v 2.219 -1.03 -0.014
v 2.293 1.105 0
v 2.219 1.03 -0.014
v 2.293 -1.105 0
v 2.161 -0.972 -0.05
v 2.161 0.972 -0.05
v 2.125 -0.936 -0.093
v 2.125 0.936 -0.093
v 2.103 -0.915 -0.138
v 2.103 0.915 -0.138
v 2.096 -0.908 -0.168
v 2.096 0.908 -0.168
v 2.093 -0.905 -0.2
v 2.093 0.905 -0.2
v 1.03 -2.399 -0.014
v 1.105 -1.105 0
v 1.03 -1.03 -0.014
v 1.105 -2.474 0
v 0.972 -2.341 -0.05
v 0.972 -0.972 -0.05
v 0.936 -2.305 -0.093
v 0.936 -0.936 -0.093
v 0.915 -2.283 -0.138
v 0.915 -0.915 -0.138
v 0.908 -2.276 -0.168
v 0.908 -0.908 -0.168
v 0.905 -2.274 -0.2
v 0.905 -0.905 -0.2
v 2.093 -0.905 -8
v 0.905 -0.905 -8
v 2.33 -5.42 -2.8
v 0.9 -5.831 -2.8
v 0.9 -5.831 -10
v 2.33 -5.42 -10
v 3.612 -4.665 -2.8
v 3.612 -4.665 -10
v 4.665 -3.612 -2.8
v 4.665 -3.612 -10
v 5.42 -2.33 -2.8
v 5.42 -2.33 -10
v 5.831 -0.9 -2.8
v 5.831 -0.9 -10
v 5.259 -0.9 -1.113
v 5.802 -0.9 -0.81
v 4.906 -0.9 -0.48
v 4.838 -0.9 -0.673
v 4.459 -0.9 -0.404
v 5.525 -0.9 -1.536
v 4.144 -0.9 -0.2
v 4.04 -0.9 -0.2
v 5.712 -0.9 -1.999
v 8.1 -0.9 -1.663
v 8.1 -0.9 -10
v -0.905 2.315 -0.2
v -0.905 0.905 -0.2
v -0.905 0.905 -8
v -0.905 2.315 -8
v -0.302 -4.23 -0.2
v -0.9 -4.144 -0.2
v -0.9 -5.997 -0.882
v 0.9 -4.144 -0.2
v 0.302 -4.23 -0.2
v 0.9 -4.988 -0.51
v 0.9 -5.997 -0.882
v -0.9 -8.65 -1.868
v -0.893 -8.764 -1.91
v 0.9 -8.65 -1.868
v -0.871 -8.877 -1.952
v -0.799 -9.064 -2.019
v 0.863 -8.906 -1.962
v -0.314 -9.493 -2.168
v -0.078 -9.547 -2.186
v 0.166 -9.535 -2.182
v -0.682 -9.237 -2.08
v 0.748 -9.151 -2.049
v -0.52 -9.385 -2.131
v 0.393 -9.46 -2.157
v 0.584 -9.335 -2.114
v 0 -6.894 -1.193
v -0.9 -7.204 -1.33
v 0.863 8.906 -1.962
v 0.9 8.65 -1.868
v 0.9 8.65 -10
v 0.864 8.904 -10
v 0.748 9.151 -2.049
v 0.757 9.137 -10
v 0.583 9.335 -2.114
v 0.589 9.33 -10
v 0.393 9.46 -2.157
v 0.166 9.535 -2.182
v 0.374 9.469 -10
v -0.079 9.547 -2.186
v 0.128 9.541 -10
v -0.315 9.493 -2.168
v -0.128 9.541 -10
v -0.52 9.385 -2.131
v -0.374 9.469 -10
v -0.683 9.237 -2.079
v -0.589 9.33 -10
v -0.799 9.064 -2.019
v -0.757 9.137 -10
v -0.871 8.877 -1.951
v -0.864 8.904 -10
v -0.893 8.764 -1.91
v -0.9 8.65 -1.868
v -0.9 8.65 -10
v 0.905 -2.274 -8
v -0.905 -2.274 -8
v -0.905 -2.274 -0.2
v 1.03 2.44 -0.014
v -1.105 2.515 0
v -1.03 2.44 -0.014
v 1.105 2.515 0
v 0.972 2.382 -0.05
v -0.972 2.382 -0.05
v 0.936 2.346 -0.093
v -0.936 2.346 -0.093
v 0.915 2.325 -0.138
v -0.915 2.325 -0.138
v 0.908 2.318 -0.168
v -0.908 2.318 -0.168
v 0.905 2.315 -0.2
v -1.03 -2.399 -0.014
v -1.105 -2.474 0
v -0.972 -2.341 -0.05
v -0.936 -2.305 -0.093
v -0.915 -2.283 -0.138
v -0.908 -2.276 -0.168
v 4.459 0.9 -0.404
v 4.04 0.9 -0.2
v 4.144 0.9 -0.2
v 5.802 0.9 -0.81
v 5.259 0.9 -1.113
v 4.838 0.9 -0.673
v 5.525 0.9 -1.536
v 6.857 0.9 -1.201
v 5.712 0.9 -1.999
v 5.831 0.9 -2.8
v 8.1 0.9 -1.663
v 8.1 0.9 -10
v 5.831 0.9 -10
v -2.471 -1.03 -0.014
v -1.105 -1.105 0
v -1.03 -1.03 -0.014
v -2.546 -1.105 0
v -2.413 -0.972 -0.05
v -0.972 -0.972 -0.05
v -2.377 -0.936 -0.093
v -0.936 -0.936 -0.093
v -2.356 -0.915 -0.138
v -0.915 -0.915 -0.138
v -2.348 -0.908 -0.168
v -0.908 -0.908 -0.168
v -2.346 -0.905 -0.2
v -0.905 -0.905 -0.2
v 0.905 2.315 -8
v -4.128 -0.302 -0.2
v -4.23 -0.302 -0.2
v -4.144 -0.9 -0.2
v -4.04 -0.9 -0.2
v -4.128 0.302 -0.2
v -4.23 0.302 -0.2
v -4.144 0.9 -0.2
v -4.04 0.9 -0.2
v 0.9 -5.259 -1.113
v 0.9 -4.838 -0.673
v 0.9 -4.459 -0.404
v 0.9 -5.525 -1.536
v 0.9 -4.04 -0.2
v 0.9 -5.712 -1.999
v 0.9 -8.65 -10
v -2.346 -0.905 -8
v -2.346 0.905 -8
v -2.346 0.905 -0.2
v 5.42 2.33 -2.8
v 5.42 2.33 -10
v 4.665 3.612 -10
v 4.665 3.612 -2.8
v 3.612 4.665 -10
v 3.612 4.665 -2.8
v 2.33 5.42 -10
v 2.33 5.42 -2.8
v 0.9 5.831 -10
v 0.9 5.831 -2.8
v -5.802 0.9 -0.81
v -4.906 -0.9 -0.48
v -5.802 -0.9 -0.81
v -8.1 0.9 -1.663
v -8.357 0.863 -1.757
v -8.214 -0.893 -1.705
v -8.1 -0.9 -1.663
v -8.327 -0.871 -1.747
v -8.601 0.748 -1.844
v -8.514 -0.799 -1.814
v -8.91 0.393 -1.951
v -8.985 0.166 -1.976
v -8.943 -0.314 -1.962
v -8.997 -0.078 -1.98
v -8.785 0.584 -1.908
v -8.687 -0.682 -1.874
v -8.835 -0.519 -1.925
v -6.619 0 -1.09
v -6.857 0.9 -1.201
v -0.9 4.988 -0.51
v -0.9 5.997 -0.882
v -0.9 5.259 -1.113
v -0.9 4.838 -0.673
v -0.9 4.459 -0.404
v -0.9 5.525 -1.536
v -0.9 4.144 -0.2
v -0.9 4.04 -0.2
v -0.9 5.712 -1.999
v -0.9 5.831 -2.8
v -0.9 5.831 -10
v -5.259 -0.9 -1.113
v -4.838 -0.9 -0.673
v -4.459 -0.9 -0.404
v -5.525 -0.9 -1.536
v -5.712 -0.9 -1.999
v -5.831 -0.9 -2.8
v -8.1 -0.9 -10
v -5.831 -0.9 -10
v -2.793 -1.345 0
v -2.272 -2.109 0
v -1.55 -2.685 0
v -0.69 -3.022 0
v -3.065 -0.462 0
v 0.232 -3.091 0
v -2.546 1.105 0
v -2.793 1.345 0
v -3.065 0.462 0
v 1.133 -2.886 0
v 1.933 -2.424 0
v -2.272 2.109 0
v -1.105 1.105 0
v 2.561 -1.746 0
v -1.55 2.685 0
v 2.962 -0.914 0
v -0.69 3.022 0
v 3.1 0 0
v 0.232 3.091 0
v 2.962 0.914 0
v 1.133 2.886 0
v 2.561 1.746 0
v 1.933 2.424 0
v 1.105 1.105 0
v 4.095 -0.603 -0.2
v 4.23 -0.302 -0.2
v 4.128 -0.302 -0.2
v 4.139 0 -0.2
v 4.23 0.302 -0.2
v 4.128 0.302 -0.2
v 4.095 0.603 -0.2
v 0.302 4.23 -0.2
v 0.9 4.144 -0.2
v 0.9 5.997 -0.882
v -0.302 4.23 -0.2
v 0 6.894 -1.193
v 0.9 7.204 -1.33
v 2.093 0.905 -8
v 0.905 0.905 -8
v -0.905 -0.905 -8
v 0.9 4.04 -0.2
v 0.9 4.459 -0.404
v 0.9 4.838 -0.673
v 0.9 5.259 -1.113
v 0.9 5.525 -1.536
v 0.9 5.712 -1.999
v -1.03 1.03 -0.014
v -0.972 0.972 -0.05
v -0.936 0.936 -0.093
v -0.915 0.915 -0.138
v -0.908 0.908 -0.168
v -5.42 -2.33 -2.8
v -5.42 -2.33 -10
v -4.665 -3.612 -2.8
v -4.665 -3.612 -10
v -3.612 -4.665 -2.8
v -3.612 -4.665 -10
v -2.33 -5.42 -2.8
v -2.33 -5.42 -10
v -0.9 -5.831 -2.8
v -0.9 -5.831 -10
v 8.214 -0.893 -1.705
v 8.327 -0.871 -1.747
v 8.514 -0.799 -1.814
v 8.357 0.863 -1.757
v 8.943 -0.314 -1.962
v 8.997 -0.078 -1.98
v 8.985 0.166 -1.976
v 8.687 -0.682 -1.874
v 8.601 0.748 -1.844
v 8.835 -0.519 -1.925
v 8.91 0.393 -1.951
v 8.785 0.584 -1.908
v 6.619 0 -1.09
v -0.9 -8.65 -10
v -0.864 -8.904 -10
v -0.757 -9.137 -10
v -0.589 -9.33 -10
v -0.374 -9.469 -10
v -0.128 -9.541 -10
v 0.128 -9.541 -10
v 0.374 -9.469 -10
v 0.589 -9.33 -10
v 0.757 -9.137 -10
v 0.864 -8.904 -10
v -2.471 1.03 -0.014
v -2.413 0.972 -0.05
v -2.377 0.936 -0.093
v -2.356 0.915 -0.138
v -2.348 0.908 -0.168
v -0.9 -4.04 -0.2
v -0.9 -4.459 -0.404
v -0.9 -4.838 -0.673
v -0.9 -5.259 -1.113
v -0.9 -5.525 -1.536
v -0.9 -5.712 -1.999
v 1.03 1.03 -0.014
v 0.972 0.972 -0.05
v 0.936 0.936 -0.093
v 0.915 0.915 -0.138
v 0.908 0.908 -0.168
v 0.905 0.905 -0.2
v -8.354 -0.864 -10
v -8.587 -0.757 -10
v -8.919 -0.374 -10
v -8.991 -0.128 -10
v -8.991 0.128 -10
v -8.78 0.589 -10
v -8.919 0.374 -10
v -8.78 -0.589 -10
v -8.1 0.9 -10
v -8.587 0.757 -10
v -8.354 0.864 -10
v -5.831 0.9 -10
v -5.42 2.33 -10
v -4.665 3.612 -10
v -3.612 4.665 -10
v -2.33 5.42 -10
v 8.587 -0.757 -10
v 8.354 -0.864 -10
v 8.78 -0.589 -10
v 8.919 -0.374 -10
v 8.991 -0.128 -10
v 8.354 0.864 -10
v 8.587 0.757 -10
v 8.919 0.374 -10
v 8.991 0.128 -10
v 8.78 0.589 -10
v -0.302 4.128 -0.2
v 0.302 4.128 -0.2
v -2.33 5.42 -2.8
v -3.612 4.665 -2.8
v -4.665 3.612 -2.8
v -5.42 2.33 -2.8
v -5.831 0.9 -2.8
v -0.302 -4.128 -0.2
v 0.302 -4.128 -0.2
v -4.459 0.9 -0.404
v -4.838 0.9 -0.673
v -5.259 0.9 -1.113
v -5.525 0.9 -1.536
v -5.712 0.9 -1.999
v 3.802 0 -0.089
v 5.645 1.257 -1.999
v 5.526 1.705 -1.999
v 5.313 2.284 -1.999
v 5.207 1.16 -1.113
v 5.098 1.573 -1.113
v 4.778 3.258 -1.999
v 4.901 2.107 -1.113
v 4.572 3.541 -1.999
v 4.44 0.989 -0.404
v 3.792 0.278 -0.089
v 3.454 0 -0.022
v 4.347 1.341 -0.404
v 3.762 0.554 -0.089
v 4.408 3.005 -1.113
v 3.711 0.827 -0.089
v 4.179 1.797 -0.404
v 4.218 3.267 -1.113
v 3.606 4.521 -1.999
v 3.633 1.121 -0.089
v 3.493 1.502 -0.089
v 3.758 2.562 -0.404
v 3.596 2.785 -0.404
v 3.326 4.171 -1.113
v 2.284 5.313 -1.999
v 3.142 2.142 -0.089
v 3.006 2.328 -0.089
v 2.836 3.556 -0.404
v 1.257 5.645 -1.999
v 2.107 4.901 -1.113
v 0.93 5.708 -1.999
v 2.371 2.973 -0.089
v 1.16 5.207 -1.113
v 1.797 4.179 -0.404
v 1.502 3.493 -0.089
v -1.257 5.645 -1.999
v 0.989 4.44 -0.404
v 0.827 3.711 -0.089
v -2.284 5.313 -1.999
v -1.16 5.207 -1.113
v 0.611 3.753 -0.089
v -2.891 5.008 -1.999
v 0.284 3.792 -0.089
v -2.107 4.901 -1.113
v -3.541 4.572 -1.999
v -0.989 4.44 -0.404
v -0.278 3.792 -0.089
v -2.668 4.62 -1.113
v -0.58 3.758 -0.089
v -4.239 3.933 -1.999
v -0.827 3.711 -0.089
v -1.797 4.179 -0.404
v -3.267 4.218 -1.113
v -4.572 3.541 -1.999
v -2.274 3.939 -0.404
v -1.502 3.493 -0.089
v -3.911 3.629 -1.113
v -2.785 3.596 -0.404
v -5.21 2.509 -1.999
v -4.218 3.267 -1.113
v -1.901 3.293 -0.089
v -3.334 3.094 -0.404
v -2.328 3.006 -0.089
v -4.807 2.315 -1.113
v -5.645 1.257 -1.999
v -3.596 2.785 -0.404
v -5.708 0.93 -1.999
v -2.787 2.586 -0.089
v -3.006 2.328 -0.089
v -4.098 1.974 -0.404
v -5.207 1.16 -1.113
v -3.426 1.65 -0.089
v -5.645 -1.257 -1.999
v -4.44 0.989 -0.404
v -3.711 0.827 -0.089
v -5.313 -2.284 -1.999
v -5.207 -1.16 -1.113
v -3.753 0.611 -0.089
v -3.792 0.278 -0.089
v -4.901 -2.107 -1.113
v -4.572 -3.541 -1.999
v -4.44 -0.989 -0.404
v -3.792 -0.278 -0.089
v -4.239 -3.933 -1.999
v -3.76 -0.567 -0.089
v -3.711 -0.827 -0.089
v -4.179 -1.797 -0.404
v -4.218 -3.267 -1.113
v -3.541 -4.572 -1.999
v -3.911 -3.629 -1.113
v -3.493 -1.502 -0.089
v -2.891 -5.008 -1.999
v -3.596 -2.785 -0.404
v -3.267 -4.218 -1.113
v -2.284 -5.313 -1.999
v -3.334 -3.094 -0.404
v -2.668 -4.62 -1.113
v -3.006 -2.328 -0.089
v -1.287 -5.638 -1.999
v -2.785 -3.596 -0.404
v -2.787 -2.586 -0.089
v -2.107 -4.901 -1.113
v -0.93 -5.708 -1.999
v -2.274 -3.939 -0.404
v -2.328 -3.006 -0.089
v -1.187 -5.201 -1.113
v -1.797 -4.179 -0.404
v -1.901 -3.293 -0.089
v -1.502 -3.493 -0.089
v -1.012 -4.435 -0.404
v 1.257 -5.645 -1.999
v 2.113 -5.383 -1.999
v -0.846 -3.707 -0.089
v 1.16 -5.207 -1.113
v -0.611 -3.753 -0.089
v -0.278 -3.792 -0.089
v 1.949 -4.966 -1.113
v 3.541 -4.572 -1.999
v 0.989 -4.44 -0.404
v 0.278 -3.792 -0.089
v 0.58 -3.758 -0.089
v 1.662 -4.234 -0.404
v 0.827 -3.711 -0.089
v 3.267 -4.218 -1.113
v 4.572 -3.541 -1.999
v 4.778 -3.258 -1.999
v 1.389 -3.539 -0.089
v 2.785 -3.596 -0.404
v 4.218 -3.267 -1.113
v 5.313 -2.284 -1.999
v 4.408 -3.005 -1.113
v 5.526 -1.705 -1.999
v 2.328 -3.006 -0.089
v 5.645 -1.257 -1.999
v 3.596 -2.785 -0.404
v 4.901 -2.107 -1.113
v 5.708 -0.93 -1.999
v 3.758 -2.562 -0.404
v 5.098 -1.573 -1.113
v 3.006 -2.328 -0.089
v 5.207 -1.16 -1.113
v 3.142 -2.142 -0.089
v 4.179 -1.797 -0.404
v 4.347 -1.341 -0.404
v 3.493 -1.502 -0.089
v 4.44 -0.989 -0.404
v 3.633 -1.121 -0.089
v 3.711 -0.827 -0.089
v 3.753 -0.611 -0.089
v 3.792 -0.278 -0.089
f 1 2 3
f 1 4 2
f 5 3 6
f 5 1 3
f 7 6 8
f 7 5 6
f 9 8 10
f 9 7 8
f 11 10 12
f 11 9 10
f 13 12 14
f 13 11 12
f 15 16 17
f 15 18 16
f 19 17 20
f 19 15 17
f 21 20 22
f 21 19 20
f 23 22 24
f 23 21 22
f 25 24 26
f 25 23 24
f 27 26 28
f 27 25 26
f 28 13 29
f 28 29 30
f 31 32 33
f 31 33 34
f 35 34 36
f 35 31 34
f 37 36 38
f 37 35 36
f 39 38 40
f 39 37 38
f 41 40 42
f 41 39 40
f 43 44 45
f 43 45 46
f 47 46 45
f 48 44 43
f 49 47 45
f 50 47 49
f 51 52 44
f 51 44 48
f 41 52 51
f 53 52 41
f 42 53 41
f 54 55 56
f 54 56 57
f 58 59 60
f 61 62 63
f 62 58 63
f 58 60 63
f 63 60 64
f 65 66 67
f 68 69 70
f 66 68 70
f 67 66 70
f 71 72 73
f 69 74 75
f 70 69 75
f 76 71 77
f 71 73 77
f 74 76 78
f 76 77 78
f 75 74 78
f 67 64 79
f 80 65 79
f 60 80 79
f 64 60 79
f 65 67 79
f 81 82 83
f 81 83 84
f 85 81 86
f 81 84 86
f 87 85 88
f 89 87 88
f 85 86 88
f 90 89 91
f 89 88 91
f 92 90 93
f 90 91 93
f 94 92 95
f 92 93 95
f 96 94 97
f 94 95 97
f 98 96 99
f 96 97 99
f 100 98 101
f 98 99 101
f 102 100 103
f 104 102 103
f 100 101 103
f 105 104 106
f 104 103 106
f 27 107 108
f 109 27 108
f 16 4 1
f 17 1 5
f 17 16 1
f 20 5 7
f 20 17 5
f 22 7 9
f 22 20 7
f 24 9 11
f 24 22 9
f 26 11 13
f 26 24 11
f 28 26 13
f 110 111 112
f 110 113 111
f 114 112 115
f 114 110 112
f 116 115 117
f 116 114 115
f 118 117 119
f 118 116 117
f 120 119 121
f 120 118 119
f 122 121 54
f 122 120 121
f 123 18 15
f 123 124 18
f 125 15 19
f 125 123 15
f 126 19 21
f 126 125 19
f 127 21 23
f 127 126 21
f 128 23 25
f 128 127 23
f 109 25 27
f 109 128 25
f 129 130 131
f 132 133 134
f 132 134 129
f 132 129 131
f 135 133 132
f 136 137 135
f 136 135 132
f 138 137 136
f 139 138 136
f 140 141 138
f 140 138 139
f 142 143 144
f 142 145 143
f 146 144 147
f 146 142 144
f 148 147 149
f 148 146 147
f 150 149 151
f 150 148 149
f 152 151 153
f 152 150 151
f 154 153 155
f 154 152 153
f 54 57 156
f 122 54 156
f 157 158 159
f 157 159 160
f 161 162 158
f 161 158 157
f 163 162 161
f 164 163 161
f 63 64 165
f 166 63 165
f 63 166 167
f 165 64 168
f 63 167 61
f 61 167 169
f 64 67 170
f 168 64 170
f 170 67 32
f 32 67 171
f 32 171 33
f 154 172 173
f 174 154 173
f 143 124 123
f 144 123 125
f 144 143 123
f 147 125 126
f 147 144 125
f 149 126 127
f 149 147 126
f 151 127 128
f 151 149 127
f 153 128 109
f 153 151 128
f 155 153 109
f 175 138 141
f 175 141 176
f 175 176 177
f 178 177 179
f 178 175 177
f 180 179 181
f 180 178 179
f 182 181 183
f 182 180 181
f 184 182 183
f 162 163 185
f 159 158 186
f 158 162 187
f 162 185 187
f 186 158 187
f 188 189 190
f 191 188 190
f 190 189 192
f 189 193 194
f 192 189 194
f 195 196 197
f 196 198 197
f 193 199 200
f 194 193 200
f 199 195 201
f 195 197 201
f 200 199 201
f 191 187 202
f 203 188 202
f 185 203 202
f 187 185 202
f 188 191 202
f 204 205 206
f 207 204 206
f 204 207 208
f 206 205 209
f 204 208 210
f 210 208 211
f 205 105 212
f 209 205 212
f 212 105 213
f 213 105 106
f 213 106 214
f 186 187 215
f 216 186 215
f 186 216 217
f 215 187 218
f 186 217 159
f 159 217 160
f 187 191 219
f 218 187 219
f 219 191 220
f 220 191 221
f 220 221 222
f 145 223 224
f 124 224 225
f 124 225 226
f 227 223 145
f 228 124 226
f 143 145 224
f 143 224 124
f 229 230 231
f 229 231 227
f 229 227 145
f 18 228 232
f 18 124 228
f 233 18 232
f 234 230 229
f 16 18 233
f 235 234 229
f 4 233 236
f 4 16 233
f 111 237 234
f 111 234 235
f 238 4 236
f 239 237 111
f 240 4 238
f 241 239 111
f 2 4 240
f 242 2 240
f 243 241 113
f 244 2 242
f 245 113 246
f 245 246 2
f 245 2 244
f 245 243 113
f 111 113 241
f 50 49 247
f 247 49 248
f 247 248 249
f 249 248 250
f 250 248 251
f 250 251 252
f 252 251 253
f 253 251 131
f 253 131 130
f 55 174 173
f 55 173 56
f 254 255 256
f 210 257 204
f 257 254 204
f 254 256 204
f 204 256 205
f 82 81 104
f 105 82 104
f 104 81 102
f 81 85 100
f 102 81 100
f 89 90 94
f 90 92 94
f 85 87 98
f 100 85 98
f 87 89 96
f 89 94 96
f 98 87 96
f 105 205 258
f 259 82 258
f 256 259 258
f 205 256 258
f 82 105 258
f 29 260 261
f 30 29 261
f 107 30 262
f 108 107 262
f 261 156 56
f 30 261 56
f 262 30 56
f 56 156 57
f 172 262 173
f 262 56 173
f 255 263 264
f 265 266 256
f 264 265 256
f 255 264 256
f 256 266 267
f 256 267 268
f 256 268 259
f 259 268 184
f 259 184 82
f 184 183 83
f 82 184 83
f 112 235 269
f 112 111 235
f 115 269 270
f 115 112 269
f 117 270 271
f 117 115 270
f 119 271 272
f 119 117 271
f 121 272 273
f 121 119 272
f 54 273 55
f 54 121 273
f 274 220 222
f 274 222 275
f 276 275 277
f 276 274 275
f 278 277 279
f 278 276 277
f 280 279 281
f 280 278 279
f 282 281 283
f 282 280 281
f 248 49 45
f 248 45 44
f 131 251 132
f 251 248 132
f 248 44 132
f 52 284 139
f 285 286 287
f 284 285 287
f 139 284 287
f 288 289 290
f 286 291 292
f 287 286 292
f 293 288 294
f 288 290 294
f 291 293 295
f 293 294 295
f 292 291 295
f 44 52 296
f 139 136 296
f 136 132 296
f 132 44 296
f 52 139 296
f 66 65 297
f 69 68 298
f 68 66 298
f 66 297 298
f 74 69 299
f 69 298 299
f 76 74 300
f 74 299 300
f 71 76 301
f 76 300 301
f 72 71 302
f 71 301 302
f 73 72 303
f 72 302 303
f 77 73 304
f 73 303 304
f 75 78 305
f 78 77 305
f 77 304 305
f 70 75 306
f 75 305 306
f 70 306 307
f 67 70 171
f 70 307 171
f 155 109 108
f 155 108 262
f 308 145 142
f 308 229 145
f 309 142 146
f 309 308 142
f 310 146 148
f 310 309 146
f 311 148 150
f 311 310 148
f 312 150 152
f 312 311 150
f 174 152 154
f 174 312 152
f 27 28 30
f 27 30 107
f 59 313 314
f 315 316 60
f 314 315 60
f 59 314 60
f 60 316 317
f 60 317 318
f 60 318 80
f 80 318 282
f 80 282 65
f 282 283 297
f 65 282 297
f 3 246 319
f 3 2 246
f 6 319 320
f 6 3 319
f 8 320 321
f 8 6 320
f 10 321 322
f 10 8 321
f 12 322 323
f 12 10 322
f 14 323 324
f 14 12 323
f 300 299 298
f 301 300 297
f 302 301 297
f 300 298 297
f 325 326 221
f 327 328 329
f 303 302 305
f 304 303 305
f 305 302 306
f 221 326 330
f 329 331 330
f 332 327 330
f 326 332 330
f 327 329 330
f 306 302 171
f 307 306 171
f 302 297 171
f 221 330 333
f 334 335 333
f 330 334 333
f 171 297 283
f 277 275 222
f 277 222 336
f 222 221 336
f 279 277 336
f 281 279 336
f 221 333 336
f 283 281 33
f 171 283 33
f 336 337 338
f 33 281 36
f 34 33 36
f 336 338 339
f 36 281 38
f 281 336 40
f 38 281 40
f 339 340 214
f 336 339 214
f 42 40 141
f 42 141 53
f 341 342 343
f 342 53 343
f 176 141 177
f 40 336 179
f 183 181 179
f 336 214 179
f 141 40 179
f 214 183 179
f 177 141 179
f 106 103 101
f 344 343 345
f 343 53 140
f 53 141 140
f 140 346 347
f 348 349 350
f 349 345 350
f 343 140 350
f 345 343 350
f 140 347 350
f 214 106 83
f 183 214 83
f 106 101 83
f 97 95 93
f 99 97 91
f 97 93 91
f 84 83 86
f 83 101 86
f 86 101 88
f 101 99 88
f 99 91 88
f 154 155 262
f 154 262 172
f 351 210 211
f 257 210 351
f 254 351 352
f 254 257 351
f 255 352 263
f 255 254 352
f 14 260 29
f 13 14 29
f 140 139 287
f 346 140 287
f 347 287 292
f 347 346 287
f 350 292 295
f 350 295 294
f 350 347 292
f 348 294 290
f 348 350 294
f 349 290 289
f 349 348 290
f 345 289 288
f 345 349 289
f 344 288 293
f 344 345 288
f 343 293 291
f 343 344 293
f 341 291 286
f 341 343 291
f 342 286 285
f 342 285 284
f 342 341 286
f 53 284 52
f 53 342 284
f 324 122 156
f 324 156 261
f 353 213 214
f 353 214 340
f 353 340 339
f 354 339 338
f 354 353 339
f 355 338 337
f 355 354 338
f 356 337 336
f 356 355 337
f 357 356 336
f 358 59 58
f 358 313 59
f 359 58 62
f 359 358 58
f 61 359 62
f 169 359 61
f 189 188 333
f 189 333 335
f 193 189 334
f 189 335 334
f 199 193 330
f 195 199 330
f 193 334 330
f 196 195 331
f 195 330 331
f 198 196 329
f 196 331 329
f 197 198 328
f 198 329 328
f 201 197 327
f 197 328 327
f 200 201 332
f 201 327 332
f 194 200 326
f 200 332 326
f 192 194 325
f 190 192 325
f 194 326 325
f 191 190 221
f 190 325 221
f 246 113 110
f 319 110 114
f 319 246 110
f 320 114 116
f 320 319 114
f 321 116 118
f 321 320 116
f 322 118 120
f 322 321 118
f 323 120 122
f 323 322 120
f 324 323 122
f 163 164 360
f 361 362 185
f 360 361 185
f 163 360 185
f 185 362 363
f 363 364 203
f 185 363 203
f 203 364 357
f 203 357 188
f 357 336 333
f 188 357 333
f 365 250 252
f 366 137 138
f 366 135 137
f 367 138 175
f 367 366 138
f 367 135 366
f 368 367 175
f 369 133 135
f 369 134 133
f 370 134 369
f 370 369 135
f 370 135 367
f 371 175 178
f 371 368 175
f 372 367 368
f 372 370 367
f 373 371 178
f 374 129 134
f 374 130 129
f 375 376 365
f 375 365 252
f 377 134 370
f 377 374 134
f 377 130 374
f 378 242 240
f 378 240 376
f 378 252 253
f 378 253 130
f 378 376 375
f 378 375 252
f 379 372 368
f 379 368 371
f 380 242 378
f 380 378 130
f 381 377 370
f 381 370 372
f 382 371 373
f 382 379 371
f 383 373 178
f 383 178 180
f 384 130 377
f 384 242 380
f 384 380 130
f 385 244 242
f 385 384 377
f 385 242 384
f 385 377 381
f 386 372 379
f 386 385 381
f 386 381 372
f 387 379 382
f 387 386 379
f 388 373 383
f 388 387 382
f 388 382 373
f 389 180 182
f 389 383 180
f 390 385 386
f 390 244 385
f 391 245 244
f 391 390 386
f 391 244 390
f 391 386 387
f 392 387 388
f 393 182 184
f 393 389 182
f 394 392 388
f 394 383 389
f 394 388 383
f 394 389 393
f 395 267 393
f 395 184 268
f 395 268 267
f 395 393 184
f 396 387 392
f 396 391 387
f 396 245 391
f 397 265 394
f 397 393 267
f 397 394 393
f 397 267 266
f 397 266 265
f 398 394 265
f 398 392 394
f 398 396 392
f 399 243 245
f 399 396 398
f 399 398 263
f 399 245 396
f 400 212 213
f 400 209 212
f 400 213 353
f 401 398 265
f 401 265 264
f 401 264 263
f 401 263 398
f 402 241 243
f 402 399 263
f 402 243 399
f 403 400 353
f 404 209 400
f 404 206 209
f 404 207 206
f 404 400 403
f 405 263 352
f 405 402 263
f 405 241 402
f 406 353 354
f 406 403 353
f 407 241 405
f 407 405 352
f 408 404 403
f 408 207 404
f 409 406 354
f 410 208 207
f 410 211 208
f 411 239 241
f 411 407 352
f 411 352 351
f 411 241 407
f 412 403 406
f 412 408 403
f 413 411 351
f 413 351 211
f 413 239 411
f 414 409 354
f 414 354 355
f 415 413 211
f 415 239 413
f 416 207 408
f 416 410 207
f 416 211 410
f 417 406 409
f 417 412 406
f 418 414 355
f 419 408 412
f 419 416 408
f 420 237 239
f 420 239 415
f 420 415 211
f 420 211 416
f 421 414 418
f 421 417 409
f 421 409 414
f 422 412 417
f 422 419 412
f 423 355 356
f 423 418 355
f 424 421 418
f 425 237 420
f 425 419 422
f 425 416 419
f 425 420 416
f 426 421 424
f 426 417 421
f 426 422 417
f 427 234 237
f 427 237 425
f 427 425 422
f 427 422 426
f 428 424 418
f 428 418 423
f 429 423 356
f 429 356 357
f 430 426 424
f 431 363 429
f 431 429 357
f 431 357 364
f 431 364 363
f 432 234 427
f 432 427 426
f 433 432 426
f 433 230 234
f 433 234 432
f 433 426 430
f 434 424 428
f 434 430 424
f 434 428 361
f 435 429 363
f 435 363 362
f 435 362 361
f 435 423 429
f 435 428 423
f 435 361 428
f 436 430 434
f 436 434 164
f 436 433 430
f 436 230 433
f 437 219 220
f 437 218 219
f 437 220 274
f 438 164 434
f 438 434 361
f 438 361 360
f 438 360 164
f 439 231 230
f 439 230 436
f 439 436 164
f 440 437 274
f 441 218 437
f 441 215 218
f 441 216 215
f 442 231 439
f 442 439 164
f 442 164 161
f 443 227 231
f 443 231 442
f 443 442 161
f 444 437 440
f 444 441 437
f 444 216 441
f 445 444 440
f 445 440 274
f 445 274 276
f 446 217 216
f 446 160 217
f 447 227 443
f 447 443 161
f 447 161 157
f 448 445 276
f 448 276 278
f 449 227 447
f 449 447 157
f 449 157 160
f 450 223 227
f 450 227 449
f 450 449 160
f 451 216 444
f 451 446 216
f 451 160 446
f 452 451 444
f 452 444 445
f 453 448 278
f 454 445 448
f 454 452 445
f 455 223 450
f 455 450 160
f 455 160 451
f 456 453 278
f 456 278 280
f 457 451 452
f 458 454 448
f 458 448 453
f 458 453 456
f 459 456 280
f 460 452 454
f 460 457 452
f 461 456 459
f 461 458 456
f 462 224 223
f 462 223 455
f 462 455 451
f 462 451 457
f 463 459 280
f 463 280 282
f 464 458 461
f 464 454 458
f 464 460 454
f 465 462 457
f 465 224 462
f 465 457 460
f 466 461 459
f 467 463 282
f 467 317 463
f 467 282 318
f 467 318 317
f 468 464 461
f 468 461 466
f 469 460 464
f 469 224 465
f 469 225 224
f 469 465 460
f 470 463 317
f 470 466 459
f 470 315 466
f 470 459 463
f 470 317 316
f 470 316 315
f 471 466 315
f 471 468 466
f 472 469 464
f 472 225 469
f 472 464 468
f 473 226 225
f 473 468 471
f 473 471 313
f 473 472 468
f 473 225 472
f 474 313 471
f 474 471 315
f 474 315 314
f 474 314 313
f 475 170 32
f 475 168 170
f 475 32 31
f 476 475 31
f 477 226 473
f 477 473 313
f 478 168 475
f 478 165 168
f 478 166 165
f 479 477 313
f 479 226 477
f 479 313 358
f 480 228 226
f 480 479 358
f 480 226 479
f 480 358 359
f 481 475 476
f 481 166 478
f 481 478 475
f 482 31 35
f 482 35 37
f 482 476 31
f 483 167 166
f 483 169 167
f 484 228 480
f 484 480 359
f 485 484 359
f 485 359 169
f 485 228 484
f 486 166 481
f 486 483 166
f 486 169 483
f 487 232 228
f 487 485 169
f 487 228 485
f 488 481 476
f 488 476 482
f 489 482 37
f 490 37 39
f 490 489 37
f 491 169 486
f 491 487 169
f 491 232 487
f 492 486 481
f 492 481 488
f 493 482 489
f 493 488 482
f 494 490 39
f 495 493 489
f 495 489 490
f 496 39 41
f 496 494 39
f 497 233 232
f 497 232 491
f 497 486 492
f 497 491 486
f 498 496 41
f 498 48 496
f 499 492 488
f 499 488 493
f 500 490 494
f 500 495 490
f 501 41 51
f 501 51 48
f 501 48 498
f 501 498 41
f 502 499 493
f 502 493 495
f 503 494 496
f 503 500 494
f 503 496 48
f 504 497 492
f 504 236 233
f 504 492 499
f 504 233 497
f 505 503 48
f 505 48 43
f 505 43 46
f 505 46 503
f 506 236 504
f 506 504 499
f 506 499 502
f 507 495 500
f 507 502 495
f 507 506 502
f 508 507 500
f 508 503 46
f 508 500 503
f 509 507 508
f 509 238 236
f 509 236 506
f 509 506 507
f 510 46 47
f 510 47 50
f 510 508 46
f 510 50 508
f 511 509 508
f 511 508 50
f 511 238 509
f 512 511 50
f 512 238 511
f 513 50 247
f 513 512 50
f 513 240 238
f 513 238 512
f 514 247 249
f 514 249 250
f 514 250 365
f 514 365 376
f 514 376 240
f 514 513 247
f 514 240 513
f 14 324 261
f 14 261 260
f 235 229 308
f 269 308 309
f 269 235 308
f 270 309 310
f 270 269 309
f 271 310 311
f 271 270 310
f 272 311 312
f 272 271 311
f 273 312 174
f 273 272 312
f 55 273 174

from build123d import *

# Parameters (mm, degrees)
SKETCH1_R      = 5.9
EXTRUDE1_DEPTH = 10
FILLET1_R      = 2.8
EXTRUDE2_DEPTH = 8
FILLET2_R      = 0.2
EXTRUDE3_DEPTH = 9.8


with BuildPart() as part:
    # Sketch1 → Extrude1 (new body)
    with BuildSketch(Plane.XY):
        Circle(SKETCH1_R)
    extrude(amount=-EXTRUDE1_DEPTH)

    # Fillet1
    fillet1_edges = [part.edges().sort_by_distance(p)[0] for p in [
        (-5.9, 0, 0),
    ]]
    fillet(fillet1_edges, radius=FILLET1_R)

    # Sketch2 → Extrude2 (cut)
    with BuildSketch(Plane.XY):
        Polygon((-0.905, 2.315), (0.905, 2.315), (0.905, 0.905), (2.09345294, 0.905), (2.09345294, -0.905), (0.905, -0.905), (0.905, -2.273521567), (-0.905, -2.273521567), (-0.905, -0.905), (-2.345549018, -0.905), (-2.345549018, 0.905), (-0.905, 0.905), align=None)
    extrude(amount=-EXTRUDE2_DEPTH, mode=Mode.SUBTRACT)

    # Fillet2
    fillet2_edges = [part.edges().sort_by_distance(p)[0] for p in [
        (-0.905, 1.61, 0),
        (-1.625274509, 0.905, 0),
        (-2.345549018, 0, 0),
        (-1.625274509, -0.905, 0),
        (-0.905, -1.589260784, 0),
        (0, -2.273521567, 0),
        (0.905, -1.589260784, 0),
        (1.49922647, -0.905, 0),
        (2.09345294, 0, 0),
        (1.49922647, 0.905, 0),
        (0.905, 1.61, 0),
        (0, 2.315, 0),
    ]]
    fillet(fillet2_edges, radius=FILLET2_R)

    # Sketch3 → Extrude3 (add)
    with BuildSketch(Plane(origin=(0, 0, -10), x_dir=(-1, 0, 0), z_dir=(0, 0, -1))):
        with BuildLine():
            Line((-3.196218134, 0.9), (-8.1, 0.9))
            ThreePointArc((-8.1, 0.9), (-9, 0), (-8.1, -0.9))
            Line((-8.1, -0.9), (-3.196218134, -0.9))
            Line((-3.196218134, -0.9), (-3.196218134, 0.9))
        make_face()
        with BuildLine():
            Line((0.9, 3.376286761), (-0.9, 3.376286761))
            Line((-0.9, 3.376286761), (-0.9, 8.65))
            ThreePointArc((-0.9, 8.65), (0, 9.55), (0.9, 8.65))
            Line((0.9, 8.65), (0.9, 3.376286761))
        make_face()
        with BuildLine():
            Line((3.340273036, 0.9), (8.1, 0.9))
            ThreePointArc((8.1, 0.9), (9, 0), (8.1, -0.9))
            Line((8.1, -0.9), (3.340273036, -0.9))
            Line((3.340273036, -0.9), (3.340273036, 0.9))
        make_face()
        with BuildLine():
            Line((-0.9, -3.358279899), (0.9, -3.358279899))
            Line((0.9, -3.358279899), (0.9, -8.65))
            ThreePointArc((0.9, -8.65), (0, -9.55), (-0.9, -8.65))
            Line((-0.9, -8.65), (-0.9, -3.358279899))
        make_face()
    extrude(amount=-EXTRUDE3_DEPTH)

    # Sketch6 → Cut-Revolve3 (revolve, cut)
    with BuildSketch(Plane(origin=(0, 0, 0), x_dir=(0, 0, -1), z_dir=(1, 0, 0))):
        Polygon((2.318539135, -9.900453163), (-0.04993414, -9.900453163), (0.123609111, -4.036856485), align=None)
    revolve(axis=Axis((0, 0, -10.502496707), (0, 0, 1)), mode=Mode.SUBTRACT)


solid = part.part
